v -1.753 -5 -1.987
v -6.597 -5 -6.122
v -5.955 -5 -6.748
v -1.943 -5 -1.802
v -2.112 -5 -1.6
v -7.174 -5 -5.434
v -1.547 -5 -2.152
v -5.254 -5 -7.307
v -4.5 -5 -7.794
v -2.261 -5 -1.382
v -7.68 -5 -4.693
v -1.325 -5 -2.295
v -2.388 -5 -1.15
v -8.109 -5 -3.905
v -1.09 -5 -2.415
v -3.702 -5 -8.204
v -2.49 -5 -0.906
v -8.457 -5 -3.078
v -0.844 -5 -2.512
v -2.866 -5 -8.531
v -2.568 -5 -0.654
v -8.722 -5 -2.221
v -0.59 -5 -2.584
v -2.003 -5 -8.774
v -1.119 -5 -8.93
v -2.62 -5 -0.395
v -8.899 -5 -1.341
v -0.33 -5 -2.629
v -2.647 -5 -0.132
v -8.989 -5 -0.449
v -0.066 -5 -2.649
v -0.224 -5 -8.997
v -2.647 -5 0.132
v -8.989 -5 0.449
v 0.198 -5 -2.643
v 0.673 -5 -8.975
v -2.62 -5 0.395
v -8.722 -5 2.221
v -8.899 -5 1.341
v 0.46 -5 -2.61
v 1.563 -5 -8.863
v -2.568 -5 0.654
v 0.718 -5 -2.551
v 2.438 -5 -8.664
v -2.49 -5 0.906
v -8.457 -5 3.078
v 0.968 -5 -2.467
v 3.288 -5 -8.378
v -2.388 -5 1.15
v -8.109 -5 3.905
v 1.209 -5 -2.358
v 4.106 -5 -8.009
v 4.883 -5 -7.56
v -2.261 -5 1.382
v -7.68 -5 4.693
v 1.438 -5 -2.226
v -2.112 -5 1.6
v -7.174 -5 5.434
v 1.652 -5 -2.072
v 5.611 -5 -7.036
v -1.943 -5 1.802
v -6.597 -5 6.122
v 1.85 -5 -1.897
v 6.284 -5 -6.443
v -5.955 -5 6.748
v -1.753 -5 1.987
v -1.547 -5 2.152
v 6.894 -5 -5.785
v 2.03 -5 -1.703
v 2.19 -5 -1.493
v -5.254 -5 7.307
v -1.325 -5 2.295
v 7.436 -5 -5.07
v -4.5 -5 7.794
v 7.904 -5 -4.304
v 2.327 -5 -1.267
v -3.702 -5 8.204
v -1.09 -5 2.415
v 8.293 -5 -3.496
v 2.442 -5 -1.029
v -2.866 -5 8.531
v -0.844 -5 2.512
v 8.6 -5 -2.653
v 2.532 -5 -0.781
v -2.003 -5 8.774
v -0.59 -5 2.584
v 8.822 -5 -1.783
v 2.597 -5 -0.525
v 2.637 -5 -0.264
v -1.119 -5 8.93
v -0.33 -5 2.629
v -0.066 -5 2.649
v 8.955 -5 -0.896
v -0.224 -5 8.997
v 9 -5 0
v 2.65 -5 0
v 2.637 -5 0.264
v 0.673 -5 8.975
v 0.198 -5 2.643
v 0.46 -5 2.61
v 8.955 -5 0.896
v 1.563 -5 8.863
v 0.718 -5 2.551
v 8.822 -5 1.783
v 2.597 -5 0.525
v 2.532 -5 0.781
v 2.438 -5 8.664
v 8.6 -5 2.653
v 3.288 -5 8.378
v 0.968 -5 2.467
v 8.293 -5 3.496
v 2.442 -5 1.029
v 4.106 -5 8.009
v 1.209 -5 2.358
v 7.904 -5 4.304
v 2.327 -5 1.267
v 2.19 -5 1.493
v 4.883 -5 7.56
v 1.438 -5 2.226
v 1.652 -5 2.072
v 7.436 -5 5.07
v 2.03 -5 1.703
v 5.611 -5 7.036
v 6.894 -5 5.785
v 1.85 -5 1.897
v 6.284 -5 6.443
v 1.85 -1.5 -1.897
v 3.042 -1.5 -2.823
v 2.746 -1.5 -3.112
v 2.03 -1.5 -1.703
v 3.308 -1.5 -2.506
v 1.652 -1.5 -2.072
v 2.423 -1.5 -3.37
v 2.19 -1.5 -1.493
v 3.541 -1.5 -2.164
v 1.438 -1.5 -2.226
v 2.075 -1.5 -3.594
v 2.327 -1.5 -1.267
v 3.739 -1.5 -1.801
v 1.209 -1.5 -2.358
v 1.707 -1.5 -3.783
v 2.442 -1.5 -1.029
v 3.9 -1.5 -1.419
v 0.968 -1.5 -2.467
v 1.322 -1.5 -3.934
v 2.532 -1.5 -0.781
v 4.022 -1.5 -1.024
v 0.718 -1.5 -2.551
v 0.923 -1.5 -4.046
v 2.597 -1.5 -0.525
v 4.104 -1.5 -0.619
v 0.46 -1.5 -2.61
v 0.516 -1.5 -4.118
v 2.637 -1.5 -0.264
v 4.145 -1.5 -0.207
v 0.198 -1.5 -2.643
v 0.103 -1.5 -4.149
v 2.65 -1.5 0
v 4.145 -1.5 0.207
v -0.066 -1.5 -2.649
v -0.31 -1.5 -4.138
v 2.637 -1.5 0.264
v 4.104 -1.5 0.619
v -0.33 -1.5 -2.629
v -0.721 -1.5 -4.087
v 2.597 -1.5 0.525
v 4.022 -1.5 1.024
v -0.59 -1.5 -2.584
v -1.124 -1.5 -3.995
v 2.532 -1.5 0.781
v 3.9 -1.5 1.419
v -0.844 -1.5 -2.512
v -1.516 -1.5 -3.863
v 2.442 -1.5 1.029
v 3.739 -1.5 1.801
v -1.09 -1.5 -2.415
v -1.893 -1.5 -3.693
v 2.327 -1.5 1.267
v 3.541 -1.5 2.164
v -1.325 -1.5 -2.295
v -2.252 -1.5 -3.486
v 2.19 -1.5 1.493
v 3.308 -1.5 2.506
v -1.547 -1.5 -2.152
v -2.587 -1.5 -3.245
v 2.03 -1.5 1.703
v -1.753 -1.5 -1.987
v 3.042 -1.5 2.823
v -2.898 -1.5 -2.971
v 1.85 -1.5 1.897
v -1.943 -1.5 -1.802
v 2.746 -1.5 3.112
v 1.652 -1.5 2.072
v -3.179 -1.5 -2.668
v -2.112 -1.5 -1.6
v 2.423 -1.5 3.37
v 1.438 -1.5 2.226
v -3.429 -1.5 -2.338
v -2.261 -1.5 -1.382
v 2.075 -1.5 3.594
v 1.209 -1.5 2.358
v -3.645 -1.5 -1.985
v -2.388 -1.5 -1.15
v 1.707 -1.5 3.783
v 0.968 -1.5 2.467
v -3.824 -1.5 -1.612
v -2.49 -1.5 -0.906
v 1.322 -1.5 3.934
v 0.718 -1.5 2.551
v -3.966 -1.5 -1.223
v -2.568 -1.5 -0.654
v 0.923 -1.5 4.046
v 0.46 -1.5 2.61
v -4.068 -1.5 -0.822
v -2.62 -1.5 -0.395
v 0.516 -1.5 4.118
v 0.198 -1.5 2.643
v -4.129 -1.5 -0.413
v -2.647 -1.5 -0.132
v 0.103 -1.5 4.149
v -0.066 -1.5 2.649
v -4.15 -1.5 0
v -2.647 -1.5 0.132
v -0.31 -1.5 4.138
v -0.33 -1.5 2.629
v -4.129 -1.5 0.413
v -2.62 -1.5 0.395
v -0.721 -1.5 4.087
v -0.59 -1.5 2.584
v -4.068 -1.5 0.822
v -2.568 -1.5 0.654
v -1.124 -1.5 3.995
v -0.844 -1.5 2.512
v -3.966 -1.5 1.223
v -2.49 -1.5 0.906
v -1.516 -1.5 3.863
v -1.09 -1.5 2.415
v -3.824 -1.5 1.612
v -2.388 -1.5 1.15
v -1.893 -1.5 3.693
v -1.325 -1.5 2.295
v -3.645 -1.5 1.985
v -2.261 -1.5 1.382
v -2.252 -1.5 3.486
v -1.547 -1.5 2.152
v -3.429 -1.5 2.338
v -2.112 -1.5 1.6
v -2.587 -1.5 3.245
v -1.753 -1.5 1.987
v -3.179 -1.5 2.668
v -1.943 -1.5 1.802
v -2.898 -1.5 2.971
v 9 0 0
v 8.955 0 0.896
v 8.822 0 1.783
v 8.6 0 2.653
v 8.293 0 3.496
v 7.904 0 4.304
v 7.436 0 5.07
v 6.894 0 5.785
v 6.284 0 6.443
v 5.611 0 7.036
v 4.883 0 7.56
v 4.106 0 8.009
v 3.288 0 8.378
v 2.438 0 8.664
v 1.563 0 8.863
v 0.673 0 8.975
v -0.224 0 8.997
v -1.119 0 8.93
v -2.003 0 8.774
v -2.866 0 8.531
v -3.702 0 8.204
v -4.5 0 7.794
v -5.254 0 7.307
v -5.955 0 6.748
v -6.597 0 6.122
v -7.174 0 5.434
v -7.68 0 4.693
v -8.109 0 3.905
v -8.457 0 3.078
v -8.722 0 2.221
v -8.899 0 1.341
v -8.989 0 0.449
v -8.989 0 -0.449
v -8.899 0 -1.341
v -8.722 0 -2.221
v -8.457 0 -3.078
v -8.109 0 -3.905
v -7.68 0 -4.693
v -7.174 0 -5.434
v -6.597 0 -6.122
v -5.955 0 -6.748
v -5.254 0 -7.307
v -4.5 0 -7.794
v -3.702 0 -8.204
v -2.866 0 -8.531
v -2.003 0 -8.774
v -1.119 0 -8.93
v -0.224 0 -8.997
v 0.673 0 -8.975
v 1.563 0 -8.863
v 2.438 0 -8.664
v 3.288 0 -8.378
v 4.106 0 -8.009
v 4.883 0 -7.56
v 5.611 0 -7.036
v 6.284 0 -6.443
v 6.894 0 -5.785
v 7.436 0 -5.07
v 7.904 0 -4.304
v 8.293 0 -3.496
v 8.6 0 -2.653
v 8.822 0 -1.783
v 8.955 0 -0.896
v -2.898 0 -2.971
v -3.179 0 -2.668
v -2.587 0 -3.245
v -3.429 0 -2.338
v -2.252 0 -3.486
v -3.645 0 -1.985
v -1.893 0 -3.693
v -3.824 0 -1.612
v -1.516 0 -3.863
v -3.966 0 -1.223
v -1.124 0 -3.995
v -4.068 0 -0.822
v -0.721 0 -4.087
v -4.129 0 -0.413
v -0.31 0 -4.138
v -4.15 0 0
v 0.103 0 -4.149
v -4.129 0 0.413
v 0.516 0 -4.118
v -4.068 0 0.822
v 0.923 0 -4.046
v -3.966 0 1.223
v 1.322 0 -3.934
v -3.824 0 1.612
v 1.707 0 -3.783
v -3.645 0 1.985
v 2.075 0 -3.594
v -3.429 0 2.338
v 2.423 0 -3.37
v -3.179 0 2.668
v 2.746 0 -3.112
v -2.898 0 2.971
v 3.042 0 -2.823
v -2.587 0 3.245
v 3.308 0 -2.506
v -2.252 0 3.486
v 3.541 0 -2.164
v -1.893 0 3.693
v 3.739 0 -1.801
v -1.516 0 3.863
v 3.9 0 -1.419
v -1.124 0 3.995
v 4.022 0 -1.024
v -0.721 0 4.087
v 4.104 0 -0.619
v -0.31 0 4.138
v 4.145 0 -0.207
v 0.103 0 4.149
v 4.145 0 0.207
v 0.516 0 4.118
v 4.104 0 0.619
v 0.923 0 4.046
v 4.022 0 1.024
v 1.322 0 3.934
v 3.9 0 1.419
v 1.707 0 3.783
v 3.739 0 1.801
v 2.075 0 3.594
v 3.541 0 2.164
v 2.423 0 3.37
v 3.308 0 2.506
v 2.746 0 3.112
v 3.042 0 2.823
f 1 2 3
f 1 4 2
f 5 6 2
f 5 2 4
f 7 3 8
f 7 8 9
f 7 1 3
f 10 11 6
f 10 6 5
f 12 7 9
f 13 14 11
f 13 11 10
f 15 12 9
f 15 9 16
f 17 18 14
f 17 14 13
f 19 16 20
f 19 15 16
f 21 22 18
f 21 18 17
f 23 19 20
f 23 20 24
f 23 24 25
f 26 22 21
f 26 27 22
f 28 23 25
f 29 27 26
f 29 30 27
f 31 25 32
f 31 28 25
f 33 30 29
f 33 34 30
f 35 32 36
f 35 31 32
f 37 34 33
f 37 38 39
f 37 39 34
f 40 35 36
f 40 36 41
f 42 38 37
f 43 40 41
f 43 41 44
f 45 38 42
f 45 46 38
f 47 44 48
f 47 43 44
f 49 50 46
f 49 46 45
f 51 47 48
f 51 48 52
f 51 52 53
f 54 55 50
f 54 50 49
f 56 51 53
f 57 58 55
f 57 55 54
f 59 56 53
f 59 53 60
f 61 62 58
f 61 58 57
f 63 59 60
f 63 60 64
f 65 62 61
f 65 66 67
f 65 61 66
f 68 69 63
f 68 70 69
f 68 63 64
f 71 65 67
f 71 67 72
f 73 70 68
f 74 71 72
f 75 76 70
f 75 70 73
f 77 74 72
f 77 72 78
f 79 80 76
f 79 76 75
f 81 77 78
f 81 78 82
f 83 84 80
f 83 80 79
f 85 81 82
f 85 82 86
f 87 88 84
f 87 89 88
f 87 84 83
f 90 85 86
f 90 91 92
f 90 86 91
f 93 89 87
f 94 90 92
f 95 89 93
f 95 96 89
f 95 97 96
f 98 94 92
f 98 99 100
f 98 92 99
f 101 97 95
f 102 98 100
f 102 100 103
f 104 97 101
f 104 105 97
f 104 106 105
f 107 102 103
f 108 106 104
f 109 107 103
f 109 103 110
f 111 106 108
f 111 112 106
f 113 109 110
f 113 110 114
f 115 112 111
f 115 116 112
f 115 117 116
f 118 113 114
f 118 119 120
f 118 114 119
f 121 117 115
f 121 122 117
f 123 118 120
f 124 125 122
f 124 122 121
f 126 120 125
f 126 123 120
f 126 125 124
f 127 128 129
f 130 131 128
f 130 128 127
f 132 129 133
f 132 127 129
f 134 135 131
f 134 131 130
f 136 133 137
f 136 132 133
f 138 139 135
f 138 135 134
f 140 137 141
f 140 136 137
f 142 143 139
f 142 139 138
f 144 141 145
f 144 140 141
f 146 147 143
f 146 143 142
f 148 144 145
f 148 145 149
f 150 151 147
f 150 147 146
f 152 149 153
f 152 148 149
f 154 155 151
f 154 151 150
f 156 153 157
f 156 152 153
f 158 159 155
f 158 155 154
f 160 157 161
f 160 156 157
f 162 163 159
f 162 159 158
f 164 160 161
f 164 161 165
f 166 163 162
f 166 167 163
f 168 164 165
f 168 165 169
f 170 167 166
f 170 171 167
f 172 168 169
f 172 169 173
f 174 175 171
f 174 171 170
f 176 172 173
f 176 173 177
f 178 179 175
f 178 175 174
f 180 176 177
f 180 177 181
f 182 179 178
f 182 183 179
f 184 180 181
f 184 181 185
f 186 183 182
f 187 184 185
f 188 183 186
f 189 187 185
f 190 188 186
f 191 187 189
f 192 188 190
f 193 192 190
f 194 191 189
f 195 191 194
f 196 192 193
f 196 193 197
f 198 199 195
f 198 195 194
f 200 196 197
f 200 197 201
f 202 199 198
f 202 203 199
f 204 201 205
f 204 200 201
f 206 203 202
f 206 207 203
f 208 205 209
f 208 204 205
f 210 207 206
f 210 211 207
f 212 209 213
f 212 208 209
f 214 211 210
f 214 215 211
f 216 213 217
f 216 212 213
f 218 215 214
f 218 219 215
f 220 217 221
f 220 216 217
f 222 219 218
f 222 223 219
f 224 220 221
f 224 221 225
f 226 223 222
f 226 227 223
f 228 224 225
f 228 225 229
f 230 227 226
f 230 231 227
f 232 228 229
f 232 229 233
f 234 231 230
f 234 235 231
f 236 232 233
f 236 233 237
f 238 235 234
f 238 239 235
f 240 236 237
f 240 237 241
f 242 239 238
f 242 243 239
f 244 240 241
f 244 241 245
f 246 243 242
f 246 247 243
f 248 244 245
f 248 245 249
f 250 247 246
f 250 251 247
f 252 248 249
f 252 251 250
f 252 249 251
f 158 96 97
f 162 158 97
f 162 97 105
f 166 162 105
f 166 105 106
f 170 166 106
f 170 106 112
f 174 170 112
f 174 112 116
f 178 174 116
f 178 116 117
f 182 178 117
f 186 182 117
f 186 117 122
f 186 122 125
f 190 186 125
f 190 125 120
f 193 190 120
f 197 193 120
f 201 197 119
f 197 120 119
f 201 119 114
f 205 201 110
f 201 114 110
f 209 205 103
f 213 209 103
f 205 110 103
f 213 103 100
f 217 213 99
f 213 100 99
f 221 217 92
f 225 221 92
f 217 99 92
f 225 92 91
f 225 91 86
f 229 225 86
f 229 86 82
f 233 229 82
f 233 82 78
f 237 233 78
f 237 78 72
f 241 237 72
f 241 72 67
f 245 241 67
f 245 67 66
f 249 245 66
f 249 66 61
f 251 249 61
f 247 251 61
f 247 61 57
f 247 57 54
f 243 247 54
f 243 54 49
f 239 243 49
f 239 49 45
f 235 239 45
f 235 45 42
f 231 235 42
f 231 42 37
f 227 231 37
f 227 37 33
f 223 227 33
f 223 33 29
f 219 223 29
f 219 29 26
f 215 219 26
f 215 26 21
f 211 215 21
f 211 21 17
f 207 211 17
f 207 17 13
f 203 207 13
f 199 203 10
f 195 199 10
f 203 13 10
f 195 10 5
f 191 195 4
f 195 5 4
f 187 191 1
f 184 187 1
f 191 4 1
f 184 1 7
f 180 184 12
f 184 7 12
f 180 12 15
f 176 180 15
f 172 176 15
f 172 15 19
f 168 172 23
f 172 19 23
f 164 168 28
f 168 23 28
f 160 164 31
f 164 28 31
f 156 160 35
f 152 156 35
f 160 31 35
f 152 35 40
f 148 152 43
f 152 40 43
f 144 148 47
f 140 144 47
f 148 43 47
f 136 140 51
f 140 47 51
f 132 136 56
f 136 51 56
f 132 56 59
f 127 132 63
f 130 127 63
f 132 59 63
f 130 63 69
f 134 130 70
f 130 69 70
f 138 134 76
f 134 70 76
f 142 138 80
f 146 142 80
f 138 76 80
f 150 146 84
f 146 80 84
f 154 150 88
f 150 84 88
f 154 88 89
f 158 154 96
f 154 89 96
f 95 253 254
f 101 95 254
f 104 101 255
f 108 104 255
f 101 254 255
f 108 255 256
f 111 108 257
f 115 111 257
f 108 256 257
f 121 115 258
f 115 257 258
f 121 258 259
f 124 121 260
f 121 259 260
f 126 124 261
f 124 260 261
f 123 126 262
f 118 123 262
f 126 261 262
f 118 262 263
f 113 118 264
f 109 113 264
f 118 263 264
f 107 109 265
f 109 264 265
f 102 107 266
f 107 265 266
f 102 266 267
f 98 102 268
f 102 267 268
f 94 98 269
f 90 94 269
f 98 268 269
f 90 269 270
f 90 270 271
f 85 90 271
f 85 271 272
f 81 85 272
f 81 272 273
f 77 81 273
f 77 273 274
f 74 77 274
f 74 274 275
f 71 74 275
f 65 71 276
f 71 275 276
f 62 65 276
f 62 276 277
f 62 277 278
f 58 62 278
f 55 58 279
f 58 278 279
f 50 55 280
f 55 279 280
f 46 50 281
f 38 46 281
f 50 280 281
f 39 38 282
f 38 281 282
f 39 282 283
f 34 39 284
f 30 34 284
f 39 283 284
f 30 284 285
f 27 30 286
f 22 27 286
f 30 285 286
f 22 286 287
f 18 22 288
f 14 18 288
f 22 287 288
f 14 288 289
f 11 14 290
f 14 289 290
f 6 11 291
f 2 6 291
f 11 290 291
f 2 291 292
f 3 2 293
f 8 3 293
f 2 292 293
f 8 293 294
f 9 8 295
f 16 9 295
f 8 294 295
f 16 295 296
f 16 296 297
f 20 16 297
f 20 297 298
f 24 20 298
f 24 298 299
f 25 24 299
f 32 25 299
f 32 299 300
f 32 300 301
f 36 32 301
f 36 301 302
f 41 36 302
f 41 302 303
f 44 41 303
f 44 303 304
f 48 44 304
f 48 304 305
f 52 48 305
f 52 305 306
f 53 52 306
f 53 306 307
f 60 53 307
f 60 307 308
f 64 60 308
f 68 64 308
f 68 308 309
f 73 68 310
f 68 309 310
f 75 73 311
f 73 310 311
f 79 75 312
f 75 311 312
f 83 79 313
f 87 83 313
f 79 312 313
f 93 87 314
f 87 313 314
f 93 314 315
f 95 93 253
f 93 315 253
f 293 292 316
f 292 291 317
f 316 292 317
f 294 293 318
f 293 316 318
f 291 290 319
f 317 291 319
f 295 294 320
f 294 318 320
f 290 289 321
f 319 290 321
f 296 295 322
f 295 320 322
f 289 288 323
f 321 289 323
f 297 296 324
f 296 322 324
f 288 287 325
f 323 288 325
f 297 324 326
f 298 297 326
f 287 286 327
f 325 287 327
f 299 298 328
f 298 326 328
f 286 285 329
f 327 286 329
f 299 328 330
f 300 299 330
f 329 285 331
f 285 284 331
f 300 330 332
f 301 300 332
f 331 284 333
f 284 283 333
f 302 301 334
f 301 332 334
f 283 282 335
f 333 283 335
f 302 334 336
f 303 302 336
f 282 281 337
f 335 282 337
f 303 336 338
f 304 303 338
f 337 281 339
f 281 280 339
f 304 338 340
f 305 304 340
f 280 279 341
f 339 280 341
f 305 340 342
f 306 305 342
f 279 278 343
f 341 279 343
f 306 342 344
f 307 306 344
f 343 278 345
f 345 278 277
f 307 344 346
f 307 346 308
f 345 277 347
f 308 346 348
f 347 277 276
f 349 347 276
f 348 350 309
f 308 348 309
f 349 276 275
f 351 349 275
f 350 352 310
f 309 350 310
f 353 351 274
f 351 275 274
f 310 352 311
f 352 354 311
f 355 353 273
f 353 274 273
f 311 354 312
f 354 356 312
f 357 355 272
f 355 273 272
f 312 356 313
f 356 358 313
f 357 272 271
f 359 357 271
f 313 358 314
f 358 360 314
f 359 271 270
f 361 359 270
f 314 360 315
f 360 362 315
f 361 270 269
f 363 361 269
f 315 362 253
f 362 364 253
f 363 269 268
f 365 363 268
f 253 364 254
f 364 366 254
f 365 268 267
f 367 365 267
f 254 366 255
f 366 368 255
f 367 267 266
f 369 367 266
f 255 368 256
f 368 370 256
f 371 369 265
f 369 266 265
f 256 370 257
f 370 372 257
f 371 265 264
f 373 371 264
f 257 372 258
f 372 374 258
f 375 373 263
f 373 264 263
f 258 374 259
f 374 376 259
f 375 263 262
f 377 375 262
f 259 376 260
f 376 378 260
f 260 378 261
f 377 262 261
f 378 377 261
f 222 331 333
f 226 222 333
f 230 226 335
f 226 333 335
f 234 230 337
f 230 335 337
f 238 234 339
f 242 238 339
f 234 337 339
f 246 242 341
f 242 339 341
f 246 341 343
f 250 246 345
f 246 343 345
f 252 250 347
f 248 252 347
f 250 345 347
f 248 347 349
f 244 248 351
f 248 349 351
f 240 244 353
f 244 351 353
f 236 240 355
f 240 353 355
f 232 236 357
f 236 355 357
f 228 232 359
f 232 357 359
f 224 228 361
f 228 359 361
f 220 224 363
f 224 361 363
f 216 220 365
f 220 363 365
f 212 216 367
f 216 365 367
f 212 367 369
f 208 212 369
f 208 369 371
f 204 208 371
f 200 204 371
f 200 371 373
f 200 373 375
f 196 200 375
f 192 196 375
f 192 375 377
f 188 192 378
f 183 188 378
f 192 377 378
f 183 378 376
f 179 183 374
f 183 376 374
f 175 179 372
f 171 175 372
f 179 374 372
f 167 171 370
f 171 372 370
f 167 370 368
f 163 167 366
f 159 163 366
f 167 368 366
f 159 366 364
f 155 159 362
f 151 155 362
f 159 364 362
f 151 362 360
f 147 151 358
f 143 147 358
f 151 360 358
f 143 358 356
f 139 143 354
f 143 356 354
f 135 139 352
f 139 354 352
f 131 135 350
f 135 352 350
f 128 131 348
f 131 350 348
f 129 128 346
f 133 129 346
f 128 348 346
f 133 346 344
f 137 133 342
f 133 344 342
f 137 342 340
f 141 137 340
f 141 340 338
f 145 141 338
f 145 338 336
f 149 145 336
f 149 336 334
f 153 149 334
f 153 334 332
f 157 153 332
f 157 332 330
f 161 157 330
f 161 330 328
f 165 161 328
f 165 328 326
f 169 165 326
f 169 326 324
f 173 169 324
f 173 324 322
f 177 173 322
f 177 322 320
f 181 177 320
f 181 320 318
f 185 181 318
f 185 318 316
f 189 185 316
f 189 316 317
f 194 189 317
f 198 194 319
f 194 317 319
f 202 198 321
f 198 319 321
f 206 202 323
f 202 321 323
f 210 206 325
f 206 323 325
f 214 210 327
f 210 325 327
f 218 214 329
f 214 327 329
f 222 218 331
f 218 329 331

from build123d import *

# Parameters (mm, degrees)
F0_R     = 9
F1_DEPTH = 5
F2_R     = 4.15
F3_DEPTH = 1.5
F4_R     = 2.65
F5_DEPTH = 5.001


with BuildPart() as f1:
    # F0 (on Front) → F1 (new body)
    with BuildSketch(Plane.XZ):
        Circle(F0_R)
    extrude(amount=F1_DEPTH)

    # F2 (on face) → F3 (cut)
    with BuildSketch(Plane(origin=(0, 0, 0), x_dir=(-1, 0, 0), z_dir=(0, 1, 0))):
        Circle(F2_R)
    extrude(amount=-F3_DEPTH, mode=Mode.SUBTRACT)

    # F4 (on face) → F5 (cut, through all)
    with BuildSketch(Plane.XZ.offset(5)):
        Circle(F4_R)
    extrude(amount=-F5_DEPTH, mode=Mode.SUBTRACT)


solid = f1.part
